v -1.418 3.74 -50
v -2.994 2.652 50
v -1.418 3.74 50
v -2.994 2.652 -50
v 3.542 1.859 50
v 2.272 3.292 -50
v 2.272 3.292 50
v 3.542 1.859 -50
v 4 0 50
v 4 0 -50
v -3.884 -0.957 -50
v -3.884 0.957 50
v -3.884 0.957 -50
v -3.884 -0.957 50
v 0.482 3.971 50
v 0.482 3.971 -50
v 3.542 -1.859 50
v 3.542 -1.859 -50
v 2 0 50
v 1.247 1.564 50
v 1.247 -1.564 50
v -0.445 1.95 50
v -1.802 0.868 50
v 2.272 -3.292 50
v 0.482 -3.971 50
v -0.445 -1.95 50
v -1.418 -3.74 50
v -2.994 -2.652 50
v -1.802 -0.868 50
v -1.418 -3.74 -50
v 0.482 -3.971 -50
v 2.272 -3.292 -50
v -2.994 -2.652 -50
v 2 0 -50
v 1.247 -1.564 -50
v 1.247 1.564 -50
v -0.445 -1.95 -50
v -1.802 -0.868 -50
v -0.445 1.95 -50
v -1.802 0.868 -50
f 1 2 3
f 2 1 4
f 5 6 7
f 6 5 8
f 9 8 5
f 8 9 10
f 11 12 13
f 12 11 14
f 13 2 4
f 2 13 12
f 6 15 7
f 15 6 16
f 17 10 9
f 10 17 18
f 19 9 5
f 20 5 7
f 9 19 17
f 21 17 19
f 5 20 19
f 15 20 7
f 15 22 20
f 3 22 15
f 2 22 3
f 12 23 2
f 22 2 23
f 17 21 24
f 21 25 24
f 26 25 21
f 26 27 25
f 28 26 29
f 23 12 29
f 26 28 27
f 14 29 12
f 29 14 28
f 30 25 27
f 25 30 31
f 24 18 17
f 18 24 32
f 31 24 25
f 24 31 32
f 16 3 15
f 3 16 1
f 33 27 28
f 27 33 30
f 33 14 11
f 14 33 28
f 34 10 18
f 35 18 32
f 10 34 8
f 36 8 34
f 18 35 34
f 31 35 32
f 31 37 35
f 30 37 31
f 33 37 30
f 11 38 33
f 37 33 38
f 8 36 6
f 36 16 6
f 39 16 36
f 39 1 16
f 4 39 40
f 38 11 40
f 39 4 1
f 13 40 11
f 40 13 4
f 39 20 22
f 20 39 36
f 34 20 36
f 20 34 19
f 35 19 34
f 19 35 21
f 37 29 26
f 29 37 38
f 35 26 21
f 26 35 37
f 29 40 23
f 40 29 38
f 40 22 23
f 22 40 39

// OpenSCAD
// See http://en.wikibooks.org/wiki/OpenSCAD_User_Manual/Include_Statement

module pipe(r1, r2, h) {
    difference() {
        cylinder(r=r1, h=h, center=true);
        cylinder(r=r2, h=h+1, center=true);
    }
}

// Following commands are called with "include" but not with "use"

echo("Printed with include but not with use");

pipe(4, 2, 100);
